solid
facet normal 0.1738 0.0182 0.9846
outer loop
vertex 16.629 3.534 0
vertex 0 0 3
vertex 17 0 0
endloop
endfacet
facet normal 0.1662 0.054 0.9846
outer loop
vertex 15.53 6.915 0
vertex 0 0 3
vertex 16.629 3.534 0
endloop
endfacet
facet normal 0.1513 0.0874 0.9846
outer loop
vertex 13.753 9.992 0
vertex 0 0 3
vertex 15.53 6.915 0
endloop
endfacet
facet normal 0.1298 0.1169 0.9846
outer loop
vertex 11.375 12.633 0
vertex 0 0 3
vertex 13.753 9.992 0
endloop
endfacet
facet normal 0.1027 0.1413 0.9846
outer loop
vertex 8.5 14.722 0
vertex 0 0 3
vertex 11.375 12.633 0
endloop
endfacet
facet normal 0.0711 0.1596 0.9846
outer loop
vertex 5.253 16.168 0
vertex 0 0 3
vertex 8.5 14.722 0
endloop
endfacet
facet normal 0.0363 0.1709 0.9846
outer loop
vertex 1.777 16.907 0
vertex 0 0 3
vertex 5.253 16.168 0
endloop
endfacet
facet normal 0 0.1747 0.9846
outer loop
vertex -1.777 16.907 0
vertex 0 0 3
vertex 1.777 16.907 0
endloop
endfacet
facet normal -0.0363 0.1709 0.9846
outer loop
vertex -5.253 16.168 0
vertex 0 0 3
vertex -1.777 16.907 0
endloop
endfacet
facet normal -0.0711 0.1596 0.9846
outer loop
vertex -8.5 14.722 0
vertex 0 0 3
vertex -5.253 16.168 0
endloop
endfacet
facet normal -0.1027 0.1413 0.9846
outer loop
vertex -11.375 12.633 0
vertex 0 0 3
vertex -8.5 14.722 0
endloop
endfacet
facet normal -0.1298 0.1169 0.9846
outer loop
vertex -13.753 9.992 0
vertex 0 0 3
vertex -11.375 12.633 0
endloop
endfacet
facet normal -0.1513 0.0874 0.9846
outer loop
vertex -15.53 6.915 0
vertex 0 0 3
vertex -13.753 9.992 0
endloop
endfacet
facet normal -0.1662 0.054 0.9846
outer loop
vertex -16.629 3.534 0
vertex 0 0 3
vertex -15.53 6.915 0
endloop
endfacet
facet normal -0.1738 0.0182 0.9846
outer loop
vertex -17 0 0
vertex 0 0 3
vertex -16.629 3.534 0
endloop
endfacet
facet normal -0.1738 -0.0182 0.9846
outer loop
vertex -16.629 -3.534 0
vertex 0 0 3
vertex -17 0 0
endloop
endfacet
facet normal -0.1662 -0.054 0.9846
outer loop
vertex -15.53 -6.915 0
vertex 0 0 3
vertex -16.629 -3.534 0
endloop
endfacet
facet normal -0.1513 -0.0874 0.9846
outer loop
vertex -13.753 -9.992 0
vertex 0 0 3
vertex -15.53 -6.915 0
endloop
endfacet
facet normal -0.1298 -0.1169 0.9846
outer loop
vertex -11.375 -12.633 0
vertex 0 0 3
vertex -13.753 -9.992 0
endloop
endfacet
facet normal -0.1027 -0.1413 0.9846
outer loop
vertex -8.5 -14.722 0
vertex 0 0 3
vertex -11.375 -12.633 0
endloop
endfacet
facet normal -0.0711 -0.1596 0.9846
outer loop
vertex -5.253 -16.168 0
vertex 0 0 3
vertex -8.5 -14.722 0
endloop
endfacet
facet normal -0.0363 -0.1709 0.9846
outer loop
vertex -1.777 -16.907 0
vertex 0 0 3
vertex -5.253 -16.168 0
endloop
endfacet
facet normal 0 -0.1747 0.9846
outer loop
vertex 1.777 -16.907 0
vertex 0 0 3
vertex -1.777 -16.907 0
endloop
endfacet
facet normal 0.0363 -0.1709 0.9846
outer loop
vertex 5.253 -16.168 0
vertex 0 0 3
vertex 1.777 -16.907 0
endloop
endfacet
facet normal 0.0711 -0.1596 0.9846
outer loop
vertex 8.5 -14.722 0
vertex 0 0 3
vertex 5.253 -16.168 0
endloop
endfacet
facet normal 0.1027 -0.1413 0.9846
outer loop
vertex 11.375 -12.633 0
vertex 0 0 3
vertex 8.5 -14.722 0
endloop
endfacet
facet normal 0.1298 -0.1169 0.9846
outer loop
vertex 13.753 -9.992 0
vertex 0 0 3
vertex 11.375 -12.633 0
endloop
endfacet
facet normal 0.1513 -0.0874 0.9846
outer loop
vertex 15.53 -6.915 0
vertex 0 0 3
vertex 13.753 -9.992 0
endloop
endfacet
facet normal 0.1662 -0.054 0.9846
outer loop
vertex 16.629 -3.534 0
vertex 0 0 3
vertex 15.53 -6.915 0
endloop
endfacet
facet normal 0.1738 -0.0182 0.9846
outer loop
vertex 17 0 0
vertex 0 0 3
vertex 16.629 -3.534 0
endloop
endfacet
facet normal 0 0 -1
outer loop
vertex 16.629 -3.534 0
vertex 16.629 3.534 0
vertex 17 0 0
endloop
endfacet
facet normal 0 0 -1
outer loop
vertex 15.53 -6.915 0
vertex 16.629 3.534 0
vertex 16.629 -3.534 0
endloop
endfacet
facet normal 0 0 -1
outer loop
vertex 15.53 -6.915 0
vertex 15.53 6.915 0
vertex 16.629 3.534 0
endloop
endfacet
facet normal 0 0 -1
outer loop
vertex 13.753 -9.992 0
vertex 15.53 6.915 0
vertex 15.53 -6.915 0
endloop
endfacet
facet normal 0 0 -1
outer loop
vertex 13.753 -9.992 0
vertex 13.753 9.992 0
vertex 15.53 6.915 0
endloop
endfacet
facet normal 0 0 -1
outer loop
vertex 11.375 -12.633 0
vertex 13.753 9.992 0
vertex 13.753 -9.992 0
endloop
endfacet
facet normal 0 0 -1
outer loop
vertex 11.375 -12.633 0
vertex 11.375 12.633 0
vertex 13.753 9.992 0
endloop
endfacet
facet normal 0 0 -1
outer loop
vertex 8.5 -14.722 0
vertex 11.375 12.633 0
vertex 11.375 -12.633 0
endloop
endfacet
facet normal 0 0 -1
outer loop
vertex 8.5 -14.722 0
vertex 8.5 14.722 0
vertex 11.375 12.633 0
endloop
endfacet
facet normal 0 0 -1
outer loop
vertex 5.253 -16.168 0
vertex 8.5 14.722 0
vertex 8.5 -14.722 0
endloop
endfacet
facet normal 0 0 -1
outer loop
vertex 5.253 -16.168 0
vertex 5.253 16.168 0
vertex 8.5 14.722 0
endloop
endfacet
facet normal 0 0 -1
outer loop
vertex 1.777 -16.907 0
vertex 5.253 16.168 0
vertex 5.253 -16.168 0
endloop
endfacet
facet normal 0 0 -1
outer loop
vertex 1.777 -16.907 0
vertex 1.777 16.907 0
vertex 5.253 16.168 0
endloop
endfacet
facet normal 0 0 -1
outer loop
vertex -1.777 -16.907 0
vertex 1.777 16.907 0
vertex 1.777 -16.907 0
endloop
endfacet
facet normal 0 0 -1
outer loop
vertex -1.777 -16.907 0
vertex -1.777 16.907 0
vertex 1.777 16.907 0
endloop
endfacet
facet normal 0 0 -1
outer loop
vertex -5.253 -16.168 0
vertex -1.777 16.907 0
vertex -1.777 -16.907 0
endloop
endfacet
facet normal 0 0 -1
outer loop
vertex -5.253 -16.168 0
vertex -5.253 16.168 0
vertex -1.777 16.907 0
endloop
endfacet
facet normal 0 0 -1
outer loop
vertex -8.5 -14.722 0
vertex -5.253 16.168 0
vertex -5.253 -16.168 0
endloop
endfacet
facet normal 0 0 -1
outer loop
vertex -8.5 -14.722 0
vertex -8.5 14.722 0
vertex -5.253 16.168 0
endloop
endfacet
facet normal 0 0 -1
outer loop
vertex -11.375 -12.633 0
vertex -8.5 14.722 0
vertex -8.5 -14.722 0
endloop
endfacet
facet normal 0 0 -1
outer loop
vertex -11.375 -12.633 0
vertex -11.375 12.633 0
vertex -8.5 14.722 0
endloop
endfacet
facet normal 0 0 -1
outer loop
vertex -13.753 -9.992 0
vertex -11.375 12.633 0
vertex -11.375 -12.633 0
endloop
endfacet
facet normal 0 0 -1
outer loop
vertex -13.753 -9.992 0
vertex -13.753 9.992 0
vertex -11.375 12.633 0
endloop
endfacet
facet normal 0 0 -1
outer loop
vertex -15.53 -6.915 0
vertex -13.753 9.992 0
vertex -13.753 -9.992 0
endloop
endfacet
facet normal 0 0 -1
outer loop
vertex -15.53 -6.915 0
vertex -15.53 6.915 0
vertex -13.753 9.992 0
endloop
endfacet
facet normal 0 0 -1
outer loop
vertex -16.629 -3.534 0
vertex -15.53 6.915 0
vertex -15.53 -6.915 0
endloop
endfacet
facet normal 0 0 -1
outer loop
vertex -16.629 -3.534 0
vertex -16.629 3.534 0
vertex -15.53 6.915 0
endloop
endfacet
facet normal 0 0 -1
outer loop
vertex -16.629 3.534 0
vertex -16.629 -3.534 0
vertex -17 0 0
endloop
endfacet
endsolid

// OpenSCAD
// Generated by SolidPython 1.0.1 on 2020-07-29 00:39:25


cylinder(h = 3, r1 = 17, r2 = 0);
/***********************************************
*********      SolidPython code:      **********
************************************************
 
# import packages: SolidPython
from solid import *
from solid.utils import *
from itertools import chain, combinations


class Resize:

    def __init__(self, scad_file):
        self.scad_file = scad_file
        #self.scad_file = import_scad(scad_file)
        # cone/cylinder param:
        self.r1 = 0
        self.r2 = 0
        self.h = 0
        # rectangular prism param:
        self.w = 0
        self.l = 0
        # ellipse param:
        self.r = 0

    # import OpenScad code (file name corresponds to shape)


    # classify shape + parameters
    def assign(self, param1, param2, param3):
        if self.scad_file == 'cone.scad':
            self.r1 = param1
            self.r2 = param2
            self.h = param3
        elif self.scad_file == 'cylinder.scad':
            self.r1 = param1
            self.r2 = param2
            self.h = param3
        elif self.scad_file == 'rectangularPrism.scad':
            self.h = param1
            self.l = param2
            self.w = param3
        else:
            self.r = param1
            self.h = param2

    # resize parameters
    def iterate(self):
        x = range(3, 20, 2)
        i = 1
        if self.scad_file == 'cone.scad':
            tempList = list(combinations(x, 2))
            for temp in tempList:
                param1 = temp[0]
                param2 = temp[1]
                filepath = 'produced_scad_files/' + 'cone' + str(param1) + '_' + str(param2) + '_' + '.scad'
                scad_render_to_file(cylinder(h=param1, r1=param2, r2=0), filepath)

        elif self.scad_file == 'cylinder.scad':
            tempList = list(combinations(x, 3))
            for temp in tempList:
                param1 = temp[0]
                param2 = temp[1]
                filepath = 'produced_scad_files/' + 'cylinder' + str(param1) + '_' + str(param2) + '_' + '.scad'
                scad_render_to_file(cylinder(h=param1, r1=param2, r2=param2), filepath)

        elif self.scad_file == 'rectangularPrism.scad':
            tempList = list(combinations(x, 3))
            for temp in tempList:
                param1 = temp[0]
                param2 = temp[1]
                param3 = temp[2]
                filepath = 'produced_scad_files/' + 'rectangularPrism' + str(param1) + '_' + str(param2) + '_' + str(
                    param3) + '.scad'
                scad_render_to_file(cube(size=(param1, param2, param3)), filepath)

        elif self.scad_file == 'ellipse.scad':
            tempList = list(combinations(x, 4))
            for temp in tempList:
                param1 = temp[0]
                param2 = temp[1]
                param3 = temp[2]
                param4 = temp[3]
                filepath = 'produced_scad_files/' + 'ellipse' + str(param1) + '_' + str(param2) + '_' + str(param3) + '_' + str(param4) + '.scad'
                scad_render_to_file(scale([param1, param2, param3])(sphere(r=param4)), filepath)

    def render_to_scadfile(self):
        scad_render_to_file(scad, 'example.scad') 
 
************************************************/
